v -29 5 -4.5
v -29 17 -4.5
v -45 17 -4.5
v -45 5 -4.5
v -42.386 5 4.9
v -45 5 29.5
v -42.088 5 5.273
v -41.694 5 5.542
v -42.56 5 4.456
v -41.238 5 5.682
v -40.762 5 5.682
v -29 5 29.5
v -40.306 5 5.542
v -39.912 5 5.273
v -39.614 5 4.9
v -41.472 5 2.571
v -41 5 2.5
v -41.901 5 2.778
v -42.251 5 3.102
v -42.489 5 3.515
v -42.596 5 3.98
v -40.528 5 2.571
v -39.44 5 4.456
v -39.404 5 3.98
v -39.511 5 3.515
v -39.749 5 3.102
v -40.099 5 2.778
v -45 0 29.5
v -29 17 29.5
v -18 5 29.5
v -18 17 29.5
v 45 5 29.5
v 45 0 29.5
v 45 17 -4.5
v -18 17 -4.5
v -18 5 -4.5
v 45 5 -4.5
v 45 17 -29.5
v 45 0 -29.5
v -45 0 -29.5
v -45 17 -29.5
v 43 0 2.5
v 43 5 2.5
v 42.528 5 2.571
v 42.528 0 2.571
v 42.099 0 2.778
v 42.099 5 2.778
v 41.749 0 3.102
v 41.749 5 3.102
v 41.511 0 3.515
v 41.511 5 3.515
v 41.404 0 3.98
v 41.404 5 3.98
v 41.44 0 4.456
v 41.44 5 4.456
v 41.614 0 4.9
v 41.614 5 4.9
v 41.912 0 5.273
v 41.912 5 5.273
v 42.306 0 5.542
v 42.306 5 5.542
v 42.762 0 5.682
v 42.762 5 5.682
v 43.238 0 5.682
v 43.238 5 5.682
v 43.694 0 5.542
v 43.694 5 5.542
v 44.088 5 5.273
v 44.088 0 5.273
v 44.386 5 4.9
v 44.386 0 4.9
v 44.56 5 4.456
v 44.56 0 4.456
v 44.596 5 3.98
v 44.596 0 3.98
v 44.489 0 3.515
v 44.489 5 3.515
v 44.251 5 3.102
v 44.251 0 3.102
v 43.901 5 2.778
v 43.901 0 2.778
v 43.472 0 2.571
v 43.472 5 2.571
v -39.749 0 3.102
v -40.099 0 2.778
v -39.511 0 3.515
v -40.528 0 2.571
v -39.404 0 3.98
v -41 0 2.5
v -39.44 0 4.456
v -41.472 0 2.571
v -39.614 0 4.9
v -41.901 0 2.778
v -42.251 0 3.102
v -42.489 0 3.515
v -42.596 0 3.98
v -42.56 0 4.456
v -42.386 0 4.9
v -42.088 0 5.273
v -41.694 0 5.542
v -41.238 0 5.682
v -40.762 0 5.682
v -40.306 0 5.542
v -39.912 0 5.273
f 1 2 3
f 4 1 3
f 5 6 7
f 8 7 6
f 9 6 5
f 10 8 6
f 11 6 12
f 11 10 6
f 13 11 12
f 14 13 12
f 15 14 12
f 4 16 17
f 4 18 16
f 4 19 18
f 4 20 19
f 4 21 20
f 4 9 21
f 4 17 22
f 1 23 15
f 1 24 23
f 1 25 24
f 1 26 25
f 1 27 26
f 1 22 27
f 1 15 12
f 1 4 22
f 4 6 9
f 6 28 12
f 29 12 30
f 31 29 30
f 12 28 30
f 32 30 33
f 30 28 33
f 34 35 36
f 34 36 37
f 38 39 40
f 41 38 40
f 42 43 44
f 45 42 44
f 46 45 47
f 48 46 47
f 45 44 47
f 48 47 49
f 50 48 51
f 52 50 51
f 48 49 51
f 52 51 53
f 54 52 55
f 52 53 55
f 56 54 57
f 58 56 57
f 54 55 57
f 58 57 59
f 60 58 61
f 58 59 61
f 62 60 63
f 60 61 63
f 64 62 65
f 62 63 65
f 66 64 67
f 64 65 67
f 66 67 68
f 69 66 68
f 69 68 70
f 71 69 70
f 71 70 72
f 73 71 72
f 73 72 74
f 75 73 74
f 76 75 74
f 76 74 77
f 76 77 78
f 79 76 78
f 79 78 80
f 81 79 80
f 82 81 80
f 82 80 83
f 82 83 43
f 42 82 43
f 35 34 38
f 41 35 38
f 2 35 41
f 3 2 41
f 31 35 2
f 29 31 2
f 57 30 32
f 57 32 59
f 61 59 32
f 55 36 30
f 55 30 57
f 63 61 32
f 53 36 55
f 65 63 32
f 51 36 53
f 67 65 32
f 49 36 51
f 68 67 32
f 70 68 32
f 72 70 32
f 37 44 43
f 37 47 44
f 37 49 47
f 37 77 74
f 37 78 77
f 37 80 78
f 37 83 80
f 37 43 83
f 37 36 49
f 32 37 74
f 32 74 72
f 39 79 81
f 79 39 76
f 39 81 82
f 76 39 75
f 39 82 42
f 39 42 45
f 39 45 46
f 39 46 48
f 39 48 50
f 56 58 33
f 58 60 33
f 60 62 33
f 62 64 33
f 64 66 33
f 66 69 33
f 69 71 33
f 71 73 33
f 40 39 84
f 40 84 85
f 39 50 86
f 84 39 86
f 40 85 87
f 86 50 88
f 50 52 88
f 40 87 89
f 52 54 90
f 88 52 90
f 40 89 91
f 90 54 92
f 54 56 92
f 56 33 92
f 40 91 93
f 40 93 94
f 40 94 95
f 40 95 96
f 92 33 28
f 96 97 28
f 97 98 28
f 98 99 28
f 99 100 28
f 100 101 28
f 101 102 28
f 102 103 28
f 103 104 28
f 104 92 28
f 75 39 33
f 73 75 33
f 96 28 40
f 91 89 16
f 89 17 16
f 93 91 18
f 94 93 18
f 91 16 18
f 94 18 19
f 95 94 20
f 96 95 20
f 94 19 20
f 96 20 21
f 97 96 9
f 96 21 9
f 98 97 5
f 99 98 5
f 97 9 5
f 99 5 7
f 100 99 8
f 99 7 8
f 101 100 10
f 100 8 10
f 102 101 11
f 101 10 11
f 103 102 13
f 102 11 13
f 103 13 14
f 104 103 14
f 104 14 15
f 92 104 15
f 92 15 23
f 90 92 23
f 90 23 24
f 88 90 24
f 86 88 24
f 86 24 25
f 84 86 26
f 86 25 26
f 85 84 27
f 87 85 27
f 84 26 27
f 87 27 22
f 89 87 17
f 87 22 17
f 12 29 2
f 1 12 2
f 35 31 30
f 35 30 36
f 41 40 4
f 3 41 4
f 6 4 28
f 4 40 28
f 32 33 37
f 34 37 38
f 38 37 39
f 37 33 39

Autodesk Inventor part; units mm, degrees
ref_plane "YZ Plane" through (0, 0, 0) normal (1, 0, 0) x (0, 1, 0)
ref_plane "XZ Plane" through (0, 0, 0) normal (0, 1, 0) x (-1, 0, 0)
ref_plane "XY Plane" through (0, 0, 0) normal (0, 0, 1) x (1, 0, 0)
sketch "Sketch1" plane through (0, 0, 0) normal (0, 1, 0) x (-1, 0, 0)
  line L0 (-45, -29.5) -> (45, -29.5)
  line L1 (45, -29.5) -> (45, 29.5)
  line L2 (45, 29.5) -> (-45, 29.5)
  line L3 (-45, 29.5) -> (-45, -29.5)
  line L4 (-45, -29.5) -> (45, 29.5) construction
  line L5 (45, -29.5) -> (-45, 29.5) construction
  point P0 (0, 0)
  dimension "d0" = 59
  dimension "d1" = 90
extrude "Extrusion1" add sketch "Sketch1" along normal blind 17
sketch "Sketch2" plane through (0, 17, 0) normal (0, 1, 0) x (1, 0, 0)
  line L0 (-45, 29.5) -> (-45, -29.5) projected
  line L1 (-45, -29.5) -> (-29, -29.5)
  line L2 (-29, -29.5) -> (-29, 4.5)
  line L3 (-29, 4.5) -> (-45, 4.5)
  line L4 (-45, 4.5) -> (-45, -29.5)
  line L5 (45, -29.5) -> (-18, -29.5)
  line L6 (-18, -29.5) -> (-18, 4.5)
  line L7 (-18, 4.5) -> (45, 4.5)
  line L8 (45, 4.5) -> (45, -29.5)
  line L9 (45, 29.5) -> (-45, 29.5) projected
  line L10 (45, -29.5) -> (45, 29.5) projected
  line L11 (-45, -29.5) -> (45, -29.5) projected
  point P0 (0, 0)
  dimension "d4" = 25
  dimension "d5" = 25
  dimension "d6" = 16
  dimension "d7" = 63
extrude "Extrusion2" cut sketch "Sketch2" against normal blind 12 contours L3 L2 L1 L0 | L8 L5 L6 L7
sketch "Sketch3" plane through (0, 0, 0) normal (0, -1, 0) x (1, 0, 0)
  line L0 (-41, 4.1) -> (43, 4.1)
  line L1 (-45, -29.5) -> (-45, 29.5) projected
  line L2 (45, 29.5) -> (45, -29.5) projected
  line L3 (-45, 29.5) -> (45, 29.5) projected
  point P0 (0, 0)
  dimension "d10" = 4
  dimension "d11" = 2
  dimension "d12" = 25.4
hole "Hole1" at (-41, 0, 4.1) at (43, 0, 4.1) direction (0, 1, 0) diameter 3.2 end through all clearance for "Flat Head Machine Screw" size "M3" standard "Ansi Metric M Profile"
equation "\"d5\" = d4"
properties part number "Eth_Switch"
